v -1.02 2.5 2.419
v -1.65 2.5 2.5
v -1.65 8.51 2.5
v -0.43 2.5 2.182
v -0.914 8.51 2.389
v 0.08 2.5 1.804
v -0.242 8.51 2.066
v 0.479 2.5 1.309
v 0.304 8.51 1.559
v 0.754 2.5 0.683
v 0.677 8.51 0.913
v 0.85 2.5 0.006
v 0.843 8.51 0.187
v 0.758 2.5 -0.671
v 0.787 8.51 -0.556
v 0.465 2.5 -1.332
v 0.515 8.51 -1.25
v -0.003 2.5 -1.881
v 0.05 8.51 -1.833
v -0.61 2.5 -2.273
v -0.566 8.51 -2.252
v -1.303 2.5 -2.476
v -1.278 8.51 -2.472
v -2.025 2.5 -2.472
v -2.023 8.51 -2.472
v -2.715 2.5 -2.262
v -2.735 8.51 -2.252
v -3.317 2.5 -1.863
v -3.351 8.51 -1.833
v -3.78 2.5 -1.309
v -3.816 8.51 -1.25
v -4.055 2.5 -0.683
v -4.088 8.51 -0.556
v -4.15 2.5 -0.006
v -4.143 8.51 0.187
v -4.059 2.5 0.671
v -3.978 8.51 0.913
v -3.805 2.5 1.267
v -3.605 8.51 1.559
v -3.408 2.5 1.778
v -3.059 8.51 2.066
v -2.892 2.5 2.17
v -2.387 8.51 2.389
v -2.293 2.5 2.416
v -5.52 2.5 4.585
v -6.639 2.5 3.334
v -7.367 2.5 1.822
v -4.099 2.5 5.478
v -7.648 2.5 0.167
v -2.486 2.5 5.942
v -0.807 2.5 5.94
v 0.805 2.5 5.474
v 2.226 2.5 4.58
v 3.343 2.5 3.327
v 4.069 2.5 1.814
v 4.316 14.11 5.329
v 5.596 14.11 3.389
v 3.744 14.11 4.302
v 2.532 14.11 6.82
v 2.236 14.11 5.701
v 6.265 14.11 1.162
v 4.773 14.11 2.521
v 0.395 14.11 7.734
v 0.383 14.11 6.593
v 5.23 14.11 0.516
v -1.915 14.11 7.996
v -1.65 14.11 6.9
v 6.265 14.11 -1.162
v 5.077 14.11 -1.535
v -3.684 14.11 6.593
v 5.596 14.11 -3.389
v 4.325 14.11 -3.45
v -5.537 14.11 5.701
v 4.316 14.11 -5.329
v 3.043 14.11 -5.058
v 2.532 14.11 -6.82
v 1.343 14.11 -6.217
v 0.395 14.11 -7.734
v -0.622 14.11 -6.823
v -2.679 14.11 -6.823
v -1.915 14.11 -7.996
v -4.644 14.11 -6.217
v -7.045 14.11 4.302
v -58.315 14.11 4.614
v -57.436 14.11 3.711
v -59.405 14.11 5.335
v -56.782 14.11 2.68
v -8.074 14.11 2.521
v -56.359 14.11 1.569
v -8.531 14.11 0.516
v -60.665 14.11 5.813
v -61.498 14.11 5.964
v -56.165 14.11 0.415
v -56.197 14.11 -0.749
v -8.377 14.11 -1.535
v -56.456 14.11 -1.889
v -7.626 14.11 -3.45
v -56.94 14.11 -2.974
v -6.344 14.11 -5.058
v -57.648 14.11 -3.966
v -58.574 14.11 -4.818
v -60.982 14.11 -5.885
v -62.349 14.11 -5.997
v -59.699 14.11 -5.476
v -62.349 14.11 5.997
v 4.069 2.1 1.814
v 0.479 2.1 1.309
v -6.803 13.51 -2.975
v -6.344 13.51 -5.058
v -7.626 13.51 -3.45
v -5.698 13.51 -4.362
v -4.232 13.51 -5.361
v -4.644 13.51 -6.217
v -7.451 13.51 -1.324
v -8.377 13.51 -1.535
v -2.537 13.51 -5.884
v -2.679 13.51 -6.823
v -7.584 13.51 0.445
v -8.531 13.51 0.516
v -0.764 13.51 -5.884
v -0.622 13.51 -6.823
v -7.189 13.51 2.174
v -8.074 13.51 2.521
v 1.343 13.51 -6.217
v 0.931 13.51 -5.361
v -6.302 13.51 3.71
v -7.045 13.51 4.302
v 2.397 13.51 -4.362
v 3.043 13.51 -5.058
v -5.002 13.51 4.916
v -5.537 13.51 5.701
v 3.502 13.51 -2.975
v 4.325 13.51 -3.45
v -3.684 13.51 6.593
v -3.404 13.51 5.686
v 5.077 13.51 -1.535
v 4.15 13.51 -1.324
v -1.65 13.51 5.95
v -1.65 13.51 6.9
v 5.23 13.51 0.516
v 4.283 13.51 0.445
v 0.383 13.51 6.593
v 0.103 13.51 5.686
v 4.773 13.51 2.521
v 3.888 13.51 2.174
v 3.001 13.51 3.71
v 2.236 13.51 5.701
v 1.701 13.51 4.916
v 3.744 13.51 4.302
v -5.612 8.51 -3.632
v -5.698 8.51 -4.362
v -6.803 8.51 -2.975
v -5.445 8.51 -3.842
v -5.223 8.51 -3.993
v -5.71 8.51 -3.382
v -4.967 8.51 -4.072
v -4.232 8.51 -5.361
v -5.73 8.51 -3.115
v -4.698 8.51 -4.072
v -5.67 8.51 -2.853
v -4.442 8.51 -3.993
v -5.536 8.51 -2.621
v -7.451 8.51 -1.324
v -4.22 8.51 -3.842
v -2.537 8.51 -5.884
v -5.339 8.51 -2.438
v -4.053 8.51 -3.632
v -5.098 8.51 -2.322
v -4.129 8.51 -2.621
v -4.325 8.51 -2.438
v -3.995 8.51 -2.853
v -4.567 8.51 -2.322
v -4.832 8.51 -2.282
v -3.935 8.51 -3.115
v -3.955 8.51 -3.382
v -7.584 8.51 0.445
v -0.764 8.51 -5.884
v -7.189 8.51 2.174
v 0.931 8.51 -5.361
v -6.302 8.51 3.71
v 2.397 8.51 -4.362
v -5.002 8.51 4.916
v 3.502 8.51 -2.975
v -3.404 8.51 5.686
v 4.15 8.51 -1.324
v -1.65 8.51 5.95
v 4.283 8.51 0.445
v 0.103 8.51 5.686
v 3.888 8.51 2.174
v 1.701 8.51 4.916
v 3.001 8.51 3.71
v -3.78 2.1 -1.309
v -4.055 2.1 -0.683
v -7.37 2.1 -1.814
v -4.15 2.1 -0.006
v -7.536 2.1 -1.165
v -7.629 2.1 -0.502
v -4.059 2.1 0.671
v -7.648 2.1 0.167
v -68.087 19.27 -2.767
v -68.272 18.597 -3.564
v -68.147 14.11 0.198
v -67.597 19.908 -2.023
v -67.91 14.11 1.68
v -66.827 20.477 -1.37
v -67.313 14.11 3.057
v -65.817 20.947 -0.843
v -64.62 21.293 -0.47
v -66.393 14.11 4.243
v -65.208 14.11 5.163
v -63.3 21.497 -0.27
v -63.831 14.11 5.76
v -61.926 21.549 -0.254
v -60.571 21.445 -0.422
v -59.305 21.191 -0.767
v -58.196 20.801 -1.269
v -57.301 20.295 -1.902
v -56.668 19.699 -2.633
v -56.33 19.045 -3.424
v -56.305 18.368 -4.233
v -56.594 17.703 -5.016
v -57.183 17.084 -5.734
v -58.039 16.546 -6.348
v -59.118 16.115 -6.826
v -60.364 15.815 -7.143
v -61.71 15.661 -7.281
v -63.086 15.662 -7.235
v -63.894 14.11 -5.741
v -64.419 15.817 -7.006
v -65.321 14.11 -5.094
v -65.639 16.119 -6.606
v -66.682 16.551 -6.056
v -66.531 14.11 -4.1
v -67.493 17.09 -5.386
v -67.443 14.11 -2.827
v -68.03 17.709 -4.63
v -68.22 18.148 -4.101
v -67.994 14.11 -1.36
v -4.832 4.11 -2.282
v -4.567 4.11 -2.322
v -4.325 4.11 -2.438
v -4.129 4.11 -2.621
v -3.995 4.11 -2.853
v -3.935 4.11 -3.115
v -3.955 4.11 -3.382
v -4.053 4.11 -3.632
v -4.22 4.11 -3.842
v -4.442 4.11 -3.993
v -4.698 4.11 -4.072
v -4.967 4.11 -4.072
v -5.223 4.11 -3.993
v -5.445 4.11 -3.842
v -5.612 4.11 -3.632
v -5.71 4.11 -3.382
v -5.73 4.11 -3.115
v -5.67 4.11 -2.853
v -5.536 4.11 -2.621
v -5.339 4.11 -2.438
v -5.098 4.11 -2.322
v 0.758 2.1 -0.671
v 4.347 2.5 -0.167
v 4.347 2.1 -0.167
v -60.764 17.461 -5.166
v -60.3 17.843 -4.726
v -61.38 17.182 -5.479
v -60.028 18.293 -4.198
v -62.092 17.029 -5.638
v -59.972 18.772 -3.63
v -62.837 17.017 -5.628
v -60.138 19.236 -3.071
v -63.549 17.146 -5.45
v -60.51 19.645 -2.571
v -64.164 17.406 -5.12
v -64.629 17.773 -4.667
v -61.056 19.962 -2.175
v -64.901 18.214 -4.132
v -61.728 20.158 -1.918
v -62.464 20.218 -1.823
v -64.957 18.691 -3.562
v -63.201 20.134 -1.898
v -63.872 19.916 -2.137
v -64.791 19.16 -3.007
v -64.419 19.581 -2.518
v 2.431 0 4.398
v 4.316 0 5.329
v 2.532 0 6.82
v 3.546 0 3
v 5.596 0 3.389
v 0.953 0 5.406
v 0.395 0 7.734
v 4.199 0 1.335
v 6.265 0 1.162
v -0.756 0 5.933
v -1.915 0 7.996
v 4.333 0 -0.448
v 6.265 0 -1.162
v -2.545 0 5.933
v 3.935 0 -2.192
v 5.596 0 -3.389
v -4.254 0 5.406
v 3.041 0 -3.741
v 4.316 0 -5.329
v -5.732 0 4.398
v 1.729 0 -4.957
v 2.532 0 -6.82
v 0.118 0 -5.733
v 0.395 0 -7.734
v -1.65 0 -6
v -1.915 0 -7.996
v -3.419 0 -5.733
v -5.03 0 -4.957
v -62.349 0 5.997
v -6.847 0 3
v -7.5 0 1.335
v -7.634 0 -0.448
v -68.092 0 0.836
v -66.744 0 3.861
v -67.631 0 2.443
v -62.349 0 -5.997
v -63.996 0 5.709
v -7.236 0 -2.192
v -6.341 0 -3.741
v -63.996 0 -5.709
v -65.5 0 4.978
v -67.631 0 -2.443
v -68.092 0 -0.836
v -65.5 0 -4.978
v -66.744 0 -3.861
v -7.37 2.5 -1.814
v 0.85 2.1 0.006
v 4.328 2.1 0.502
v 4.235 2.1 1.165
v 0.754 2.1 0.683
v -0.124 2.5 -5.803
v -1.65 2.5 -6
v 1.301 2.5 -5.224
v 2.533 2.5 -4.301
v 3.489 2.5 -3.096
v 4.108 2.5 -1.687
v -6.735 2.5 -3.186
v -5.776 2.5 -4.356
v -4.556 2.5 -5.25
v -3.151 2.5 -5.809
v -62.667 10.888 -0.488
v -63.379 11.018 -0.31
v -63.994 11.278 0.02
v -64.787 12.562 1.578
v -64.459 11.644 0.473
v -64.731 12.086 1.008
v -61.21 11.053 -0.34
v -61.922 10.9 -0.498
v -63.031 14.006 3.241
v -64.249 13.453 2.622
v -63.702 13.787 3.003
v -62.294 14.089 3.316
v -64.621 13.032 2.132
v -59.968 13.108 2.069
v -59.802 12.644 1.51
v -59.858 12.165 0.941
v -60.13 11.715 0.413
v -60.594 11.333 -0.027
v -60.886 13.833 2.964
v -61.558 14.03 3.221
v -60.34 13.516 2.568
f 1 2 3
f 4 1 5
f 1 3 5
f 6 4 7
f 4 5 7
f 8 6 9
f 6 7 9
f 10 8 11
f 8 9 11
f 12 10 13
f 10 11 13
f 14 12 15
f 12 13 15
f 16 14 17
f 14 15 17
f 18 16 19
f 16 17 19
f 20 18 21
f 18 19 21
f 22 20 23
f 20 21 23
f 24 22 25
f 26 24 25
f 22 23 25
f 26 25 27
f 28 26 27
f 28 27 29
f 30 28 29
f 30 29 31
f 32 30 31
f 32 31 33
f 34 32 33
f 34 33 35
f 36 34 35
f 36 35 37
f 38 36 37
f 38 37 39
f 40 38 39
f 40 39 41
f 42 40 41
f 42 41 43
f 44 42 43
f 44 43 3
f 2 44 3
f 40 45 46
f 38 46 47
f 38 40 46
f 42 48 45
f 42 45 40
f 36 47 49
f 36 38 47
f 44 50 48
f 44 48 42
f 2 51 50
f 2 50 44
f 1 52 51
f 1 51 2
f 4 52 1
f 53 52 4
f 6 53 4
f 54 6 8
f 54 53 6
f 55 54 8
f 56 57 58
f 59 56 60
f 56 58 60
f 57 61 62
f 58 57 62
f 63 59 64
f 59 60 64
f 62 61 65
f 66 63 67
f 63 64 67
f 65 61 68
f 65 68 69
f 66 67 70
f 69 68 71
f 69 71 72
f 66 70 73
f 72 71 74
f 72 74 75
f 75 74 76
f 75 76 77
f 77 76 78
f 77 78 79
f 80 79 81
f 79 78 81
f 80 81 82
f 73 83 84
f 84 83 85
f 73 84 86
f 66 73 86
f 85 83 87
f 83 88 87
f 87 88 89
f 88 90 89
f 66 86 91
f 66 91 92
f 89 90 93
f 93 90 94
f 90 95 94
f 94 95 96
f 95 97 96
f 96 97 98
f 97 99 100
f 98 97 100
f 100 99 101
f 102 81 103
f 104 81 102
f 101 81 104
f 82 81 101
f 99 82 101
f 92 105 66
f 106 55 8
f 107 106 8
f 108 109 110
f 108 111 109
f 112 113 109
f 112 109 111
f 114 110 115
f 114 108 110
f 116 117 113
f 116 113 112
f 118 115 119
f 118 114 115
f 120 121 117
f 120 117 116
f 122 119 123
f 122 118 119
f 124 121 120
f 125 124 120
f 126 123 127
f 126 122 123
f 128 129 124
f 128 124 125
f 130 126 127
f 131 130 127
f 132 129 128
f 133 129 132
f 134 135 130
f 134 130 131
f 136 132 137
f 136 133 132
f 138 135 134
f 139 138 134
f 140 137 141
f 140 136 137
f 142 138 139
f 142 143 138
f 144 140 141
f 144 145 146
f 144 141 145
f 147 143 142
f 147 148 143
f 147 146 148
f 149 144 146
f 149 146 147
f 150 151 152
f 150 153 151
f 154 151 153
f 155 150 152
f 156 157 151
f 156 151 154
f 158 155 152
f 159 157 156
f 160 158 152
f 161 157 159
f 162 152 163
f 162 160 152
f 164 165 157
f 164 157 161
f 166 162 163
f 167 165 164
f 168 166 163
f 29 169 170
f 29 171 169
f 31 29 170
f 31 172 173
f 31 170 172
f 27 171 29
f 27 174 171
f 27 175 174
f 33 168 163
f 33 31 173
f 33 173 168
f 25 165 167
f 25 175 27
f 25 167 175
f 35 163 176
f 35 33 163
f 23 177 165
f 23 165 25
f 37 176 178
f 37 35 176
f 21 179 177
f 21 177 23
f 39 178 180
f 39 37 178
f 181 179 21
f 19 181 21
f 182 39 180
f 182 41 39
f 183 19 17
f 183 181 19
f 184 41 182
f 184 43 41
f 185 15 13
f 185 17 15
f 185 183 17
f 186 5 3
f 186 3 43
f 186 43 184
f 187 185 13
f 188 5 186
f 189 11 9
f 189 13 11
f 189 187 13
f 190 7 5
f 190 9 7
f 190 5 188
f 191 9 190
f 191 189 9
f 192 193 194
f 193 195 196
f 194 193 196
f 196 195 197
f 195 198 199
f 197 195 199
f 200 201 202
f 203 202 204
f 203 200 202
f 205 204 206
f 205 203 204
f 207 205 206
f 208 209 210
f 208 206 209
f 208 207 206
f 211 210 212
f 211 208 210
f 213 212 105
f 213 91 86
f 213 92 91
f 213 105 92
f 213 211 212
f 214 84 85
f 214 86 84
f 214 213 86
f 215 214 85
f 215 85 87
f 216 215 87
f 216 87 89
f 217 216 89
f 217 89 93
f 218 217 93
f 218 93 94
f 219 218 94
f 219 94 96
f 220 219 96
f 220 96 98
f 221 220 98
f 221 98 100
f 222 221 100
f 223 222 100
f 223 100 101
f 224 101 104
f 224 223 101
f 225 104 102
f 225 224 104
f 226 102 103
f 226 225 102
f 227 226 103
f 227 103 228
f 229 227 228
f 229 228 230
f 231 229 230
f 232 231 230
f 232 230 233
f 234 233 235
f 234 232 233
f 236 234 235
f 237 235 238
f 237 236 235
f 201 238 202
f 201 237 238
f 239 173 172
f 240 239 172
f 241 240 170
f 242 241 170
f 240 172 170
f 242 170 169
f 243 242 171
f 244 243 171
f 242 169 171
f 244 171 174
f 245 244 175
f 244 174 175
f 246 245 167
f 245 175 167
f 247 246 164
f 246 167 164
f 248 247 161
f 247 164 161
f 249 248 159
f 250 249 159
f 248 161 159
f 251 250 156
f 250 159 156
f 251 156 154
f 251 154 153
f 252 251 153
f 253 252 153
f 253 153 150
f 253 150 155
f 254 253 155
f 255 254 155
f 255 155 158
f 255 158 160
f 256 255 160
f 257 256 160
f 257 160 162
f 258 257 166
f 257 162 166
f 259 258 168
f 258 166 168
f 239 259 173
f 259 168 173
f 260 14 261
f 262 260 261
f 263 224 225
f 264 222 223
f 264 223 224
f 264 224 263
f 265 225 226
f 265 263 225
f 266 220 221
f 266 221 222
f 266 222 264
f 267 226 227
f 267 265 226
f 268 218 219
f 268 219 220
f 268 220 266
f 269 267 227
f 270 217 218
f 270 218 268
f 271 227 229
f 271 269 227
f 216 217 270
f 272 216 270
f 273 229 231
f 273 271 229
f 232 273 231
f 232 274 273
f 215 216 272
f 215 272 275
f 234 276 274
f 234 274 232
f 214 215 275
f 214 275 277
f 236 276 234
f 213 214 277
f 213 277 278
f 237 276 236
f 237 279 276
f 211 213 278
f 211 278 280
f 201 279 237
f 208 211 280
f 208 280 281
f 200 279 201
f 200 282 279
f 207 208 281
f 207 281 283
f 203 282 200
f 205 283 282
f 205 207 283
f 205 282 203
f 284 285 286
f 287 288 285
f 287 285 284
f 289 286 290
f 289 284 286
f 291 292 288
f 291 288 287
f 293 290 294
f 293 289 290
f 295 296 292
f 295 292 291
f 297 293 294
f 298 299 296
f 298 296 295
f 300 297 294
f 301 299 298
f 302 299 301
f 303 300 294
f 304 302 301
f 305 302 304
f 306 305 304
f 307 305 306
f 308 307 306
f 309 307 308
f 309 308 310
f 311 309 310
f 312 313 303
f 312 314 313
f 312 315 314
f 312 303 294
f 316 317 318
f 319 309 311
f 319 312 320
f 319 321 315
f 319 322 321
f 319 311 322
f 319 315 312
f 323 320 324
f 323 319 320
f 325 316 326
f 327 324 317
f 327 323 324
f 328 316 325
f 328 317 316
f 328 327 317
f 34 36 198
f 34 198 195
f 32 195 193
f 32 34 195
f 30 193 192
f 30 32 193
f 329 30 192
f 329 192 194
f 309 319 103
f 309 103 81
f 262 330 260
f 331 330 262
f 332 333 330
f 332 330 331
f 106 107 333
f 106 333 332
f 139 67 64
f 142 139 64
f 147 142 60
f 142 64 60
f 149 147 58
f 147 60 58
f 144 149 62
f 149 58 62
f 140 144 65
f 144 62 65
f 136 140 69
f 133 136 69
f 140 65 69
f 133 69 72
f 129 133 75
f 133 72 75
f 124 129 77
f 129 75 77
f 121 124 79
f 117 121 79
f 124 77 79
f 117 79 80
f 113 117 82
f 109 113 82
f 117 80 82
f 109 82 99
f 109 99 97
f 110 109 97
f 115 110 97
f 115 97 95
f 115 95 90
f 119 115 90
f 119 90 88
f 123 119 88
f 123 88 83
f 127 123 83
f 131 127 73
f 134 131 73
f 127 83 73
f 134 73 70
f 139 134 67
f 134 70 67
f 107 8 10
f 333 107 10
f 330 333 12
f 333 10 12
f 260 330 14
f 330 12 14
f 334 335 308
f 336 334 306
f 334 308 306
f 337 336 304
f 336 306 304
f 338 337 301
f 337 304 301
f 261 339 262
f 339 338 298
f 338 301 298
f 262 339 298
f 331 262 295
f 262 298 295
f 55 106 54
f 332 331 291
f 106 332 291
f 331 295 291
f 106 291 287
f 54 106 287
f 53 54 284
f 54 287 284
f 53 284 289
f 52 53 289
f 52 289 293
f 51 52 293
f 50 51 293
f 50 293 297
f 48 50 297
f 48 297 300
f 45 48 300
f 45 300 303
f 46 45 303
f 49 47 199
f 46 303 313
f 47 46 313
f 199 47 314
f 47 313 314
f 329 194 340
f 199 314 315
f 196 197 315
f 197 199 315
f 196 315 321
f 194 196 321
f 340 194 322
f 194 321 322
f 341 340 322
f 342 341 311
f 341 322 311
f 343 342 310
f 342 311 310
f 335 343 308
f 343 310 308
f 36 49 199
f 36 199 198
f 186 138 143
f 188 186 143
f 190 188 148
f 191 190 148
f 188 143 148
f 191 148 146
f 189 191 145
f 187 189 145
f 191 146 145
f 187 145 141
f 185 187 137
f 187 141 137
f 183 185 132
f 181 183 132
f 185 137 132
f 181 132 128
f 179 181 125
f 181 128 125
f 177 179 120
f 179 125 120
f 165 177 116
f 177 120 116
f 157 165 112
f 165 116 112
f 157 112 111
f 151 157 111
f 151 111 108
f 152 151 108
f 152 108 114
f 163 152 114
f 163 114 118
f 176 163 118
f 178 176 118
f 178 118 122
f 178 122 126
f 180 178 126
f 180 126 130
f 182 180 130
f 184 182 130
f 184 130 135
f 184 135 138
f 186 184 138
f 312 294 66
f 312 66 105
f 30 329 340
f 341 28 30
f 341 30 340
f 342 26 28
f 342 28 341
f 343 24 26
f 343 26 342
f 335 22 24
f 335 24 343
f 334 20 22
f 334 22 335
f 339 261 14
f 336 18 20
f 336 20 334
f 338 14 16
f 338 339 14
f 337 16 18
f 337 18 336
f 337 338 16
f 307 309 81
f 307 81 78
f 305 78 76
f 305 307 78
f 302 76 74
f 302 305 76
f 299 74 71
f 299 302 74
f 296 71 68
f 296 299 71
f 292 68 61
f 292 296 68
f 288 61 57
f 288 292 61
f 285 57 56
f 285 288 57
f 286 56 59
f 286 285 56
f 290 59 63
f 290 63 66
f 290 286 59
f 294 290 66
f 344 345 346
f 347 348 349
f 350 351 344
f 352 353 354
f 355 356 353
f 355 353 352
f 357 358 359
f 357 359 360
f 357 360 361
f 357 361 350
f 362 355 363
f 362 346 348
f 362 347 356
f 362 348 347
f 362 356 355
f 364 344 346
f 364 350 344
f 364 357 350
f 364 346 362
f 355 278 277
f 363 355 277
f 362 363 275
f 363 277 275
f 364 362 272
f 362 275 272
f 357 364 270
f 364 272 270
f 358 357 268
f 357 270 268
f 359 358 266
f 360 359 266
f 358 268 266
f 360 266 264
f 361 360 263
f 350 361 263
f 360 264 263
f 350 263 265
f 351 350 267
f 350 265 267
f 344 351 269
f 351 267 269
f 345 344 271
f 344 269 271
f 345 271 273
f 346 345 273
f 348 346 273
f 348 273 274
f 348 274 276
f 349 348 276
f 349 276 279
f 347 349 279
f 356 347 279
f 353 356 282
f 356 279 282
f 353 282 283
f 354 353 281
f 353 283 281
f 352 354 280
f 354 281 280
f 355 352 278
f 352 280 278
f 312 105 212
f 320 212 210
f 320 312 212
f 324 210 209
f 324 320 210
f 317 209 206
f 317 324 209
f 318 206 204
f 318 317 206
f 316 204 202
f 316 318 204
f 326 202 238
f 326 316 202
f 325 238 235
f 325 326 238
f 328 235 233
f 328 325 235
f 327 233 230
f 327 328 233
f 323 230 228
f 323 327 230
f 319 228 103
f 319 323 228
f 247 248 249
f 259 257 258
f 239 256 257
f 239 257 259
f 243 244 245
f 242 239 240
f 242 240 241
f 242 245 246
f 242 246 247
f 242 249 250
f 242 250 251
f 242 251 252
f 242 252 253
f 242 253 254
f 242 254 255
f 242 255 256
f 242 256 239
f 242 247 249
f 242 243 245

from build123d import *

# Parameters (mm, degrees)
BOSS_EXTRUDE1_DEPTH = 14.11
SKETCH2_R           = 5.95
CUT_EXTRUDE1_DEPTH  = 5.6
SKETCH3_R           = 6.9
CUT_EXTRUDE2_DEPTH  = 0.6
SKETCH4_R           = 2.5
CUT_EXTRUDE3_DEPTH  = 70.144106761
SKETCH5_R           = 0.9
CUT_EXTRUDE4_DEPTH  = 4.4
SKETCH6_R           = 6
CUT_EXTRUDE6_DEPTH  = 2.5
BOSS_EXTRUDE5_DEPTH = 0.4
BOSS_EXTRUDE6_REACH = 73.866
SKETCH13_RX         = 6
SKETCH13_RY         = 4.596266659
SKETCH14_R          = 2.5
CUT_EXTRUDE8_DEPTH  = 8


with BuildPart() as part:
    # Sketch1 → Boss-Extrude1 (new body)
    with BuildSketch(Plane(origin=(0, 0, 0), x_dir=(1, 0, 0), z_dir=(0, 1, 0))):
        with BuildLine():
            Line((-62.34882326, 5.996720639), (-1.914938962, 7.995627519))
            ThreePointArc((-1.914938962, 7.995627519), (6.349523848, 0), (-1.914938962, -7.995627519))
            Line((-1.914938962, -7.995627519), (-62.34882326, -5.996720639))
            ThreePointArc((-62.34882326, -5.996720639), (-68.150476152, 0), (-62.34882326, 5.996720639))
        make_face()
    extrude(amount=BOSS_EXTRUDE1_DEPTH)

    # Sketch2 → Cut-Extrude1 (cut)
    with BuildSketch(Plane(origin=(0, 14.11, 0), x_dir=(1, 0, 0), z_dir=(0, 1, 0))):
        with Locations(Location((-1.650476152, 0, 0), (0, 0, 270))):
            Circle(SKETCH2_R)
    extrude(amount=-CUT_EXTRUDE1_DEPTH, mode=Mode.SUBTRACT)

    # Sketch3 → Cut-Extrude2 (cut)
    with BuildSketch(Plane(origin=(0, 14.11, 0), x_dir=(1, 0, 0), z_dir=(0, 1, 0))):
        with Locations(Location((-1.650476152, 0, 0), (0, 0, 270))):
            Circle(SKETCH3_R)
    extrude(amount=-CUT_EXTRUDE2_DEPTH, mode=Mode.SUBTRACT)

    # Sketch4 → Cut-Extrude3 (cut, through all)
    with BuildSketch(Plane(origin=(0, 8.51, 0), x_dir=(1, 0, 0), z_dir=(0, 1, 0))):
        with Locations(Location((-1.650476152, 0, 0), (0, 0, 270))):
            Circle(SKETCH4_R)
    extrude(amount=-CUT_EXTRUDE3_DEPTH, mode=Mode.SUBTRACT)

    # Sketch5 → Cut-Extrude4 (cut)
    with BuildSketch(Plane(origin=(0, 8.51, 0), x_dir=(1, 0, 0), z_dir=(0, 1, 0))):
        with Locations(Location((-4.832456668, 3.181980515, 0), (0, 0, 270))):
            Circle(SKETCH5_R)
    extrude(amount=-CUT_EXTRUDE4_DEPTH, mode=Mode.SUBTRACT)

    # Sketch6 → Cut-Extrude6 (cut)
    with BuildSketch(Plane.XZ):
        with Locations(Location((-1.650476152, 0, 0), (0, 0, 270))):
            Circle(SKETCH6_R)
    extrude(amount=-CUT_EXTRUDE6_DEPTH, mode=Mode.SUBTRACT)

    # Sketch10 → Boss-Extrude5 (add)
    with BuildSketch(Plane.XZ.offset(-2.5)):
        with BuildLine():
            Line((0.75768614, -0.671382434), (4.34720185, -0.1669089))
            ThreePointArc((4.34720185, -0.1669089), (4.29113226, 0.835038606), (4.068855648, 1.813627238))
            Line((4.068855648, 1.813627238), (0.479339938, 1.309153704))
            ThreePointArc((0.479339938, 1.309153704), (0.82519402, 0.347932752), (0.75768614, -0.671382434))
        make_face()
        with BuildLine():
            Line((-7.648154155, 0.1669089), (-4.058638445, 0.671382434))
            ThreePointArc((-4.058638445, 0.671382434), (-4.126146324, -0.347932752), (-3.780292243, -1.309153704))
            Line((-3.780292243, -1.309153704), (-7.369807953, -1.813627238))
            ThreePointArc((-7.369807953, -1.813627238), (-7.592084565, -0.835038606), (-7.648154155, 0.1669089))
        make_face()
    extrude(amount=BOSS_EXTRUDE5_DEPTH)

    # Boss-Extrude6: up to this plane
    boss_extrude6_end = Plane(origin=(-1.650476152, 14.11, 0), z_dir=(0, 1, 0))
    # Sketch13 → Boss-Extrude6 (add, up to the surface)
    with BuildSketch(Plane(origin=(-0.382193209, 13.778273936, -11.555025608), x_dir=(0.9997443283307086, 0.02124917717972034, -0.007729840862870826), z_dir=(-0.02124917717972034, 0.766044443118977, -0.6424362876081342)), mode=Mode.PRIVATE) as boss_extrude6_sk1:
        with Locations(Location((-61.834760146, -9.545189308), (0, 0, -178.105579493))):
            Ellipse(SKETCH13_RX, SKETCH13_RY)
    boss_extrude6_tool1 = split(extrude(boss_extrude6_sk1.sketch, amount=-BOSS_EXTRUDE6_REACH, mode=Mode.PRIVATE), bisect_by=boss_extrude6_end, keep=Keep.BOTH, mode=Mode.PRIVATE)
    add(boss_extrude6_tool1.solids().sort_by_distance((-62.274927, 18.596512, -3.762573))[0])

    # Sketch14 → Cut-Extrude8 (cut)
    with BuildSketch(Plane(origin=(-0.382193209, 13.778273936, -11.555025608), x_dir=(0.9997742107441985, 0.01628149028495012, -0.013654325502060603), z_dir=(-0.02124917717972034, 0.766044443118977, -0.6424362876081342))):
        with Locations(Location((-62.096233495, -9.094616235, 0), (0, 0, 270))):
            Circle(SKETCH14_R)
    extrude(amount=-CUT_EXTRUDE8_DEPTH, mode=Mode.SUBTRACT)


solid = part.part
